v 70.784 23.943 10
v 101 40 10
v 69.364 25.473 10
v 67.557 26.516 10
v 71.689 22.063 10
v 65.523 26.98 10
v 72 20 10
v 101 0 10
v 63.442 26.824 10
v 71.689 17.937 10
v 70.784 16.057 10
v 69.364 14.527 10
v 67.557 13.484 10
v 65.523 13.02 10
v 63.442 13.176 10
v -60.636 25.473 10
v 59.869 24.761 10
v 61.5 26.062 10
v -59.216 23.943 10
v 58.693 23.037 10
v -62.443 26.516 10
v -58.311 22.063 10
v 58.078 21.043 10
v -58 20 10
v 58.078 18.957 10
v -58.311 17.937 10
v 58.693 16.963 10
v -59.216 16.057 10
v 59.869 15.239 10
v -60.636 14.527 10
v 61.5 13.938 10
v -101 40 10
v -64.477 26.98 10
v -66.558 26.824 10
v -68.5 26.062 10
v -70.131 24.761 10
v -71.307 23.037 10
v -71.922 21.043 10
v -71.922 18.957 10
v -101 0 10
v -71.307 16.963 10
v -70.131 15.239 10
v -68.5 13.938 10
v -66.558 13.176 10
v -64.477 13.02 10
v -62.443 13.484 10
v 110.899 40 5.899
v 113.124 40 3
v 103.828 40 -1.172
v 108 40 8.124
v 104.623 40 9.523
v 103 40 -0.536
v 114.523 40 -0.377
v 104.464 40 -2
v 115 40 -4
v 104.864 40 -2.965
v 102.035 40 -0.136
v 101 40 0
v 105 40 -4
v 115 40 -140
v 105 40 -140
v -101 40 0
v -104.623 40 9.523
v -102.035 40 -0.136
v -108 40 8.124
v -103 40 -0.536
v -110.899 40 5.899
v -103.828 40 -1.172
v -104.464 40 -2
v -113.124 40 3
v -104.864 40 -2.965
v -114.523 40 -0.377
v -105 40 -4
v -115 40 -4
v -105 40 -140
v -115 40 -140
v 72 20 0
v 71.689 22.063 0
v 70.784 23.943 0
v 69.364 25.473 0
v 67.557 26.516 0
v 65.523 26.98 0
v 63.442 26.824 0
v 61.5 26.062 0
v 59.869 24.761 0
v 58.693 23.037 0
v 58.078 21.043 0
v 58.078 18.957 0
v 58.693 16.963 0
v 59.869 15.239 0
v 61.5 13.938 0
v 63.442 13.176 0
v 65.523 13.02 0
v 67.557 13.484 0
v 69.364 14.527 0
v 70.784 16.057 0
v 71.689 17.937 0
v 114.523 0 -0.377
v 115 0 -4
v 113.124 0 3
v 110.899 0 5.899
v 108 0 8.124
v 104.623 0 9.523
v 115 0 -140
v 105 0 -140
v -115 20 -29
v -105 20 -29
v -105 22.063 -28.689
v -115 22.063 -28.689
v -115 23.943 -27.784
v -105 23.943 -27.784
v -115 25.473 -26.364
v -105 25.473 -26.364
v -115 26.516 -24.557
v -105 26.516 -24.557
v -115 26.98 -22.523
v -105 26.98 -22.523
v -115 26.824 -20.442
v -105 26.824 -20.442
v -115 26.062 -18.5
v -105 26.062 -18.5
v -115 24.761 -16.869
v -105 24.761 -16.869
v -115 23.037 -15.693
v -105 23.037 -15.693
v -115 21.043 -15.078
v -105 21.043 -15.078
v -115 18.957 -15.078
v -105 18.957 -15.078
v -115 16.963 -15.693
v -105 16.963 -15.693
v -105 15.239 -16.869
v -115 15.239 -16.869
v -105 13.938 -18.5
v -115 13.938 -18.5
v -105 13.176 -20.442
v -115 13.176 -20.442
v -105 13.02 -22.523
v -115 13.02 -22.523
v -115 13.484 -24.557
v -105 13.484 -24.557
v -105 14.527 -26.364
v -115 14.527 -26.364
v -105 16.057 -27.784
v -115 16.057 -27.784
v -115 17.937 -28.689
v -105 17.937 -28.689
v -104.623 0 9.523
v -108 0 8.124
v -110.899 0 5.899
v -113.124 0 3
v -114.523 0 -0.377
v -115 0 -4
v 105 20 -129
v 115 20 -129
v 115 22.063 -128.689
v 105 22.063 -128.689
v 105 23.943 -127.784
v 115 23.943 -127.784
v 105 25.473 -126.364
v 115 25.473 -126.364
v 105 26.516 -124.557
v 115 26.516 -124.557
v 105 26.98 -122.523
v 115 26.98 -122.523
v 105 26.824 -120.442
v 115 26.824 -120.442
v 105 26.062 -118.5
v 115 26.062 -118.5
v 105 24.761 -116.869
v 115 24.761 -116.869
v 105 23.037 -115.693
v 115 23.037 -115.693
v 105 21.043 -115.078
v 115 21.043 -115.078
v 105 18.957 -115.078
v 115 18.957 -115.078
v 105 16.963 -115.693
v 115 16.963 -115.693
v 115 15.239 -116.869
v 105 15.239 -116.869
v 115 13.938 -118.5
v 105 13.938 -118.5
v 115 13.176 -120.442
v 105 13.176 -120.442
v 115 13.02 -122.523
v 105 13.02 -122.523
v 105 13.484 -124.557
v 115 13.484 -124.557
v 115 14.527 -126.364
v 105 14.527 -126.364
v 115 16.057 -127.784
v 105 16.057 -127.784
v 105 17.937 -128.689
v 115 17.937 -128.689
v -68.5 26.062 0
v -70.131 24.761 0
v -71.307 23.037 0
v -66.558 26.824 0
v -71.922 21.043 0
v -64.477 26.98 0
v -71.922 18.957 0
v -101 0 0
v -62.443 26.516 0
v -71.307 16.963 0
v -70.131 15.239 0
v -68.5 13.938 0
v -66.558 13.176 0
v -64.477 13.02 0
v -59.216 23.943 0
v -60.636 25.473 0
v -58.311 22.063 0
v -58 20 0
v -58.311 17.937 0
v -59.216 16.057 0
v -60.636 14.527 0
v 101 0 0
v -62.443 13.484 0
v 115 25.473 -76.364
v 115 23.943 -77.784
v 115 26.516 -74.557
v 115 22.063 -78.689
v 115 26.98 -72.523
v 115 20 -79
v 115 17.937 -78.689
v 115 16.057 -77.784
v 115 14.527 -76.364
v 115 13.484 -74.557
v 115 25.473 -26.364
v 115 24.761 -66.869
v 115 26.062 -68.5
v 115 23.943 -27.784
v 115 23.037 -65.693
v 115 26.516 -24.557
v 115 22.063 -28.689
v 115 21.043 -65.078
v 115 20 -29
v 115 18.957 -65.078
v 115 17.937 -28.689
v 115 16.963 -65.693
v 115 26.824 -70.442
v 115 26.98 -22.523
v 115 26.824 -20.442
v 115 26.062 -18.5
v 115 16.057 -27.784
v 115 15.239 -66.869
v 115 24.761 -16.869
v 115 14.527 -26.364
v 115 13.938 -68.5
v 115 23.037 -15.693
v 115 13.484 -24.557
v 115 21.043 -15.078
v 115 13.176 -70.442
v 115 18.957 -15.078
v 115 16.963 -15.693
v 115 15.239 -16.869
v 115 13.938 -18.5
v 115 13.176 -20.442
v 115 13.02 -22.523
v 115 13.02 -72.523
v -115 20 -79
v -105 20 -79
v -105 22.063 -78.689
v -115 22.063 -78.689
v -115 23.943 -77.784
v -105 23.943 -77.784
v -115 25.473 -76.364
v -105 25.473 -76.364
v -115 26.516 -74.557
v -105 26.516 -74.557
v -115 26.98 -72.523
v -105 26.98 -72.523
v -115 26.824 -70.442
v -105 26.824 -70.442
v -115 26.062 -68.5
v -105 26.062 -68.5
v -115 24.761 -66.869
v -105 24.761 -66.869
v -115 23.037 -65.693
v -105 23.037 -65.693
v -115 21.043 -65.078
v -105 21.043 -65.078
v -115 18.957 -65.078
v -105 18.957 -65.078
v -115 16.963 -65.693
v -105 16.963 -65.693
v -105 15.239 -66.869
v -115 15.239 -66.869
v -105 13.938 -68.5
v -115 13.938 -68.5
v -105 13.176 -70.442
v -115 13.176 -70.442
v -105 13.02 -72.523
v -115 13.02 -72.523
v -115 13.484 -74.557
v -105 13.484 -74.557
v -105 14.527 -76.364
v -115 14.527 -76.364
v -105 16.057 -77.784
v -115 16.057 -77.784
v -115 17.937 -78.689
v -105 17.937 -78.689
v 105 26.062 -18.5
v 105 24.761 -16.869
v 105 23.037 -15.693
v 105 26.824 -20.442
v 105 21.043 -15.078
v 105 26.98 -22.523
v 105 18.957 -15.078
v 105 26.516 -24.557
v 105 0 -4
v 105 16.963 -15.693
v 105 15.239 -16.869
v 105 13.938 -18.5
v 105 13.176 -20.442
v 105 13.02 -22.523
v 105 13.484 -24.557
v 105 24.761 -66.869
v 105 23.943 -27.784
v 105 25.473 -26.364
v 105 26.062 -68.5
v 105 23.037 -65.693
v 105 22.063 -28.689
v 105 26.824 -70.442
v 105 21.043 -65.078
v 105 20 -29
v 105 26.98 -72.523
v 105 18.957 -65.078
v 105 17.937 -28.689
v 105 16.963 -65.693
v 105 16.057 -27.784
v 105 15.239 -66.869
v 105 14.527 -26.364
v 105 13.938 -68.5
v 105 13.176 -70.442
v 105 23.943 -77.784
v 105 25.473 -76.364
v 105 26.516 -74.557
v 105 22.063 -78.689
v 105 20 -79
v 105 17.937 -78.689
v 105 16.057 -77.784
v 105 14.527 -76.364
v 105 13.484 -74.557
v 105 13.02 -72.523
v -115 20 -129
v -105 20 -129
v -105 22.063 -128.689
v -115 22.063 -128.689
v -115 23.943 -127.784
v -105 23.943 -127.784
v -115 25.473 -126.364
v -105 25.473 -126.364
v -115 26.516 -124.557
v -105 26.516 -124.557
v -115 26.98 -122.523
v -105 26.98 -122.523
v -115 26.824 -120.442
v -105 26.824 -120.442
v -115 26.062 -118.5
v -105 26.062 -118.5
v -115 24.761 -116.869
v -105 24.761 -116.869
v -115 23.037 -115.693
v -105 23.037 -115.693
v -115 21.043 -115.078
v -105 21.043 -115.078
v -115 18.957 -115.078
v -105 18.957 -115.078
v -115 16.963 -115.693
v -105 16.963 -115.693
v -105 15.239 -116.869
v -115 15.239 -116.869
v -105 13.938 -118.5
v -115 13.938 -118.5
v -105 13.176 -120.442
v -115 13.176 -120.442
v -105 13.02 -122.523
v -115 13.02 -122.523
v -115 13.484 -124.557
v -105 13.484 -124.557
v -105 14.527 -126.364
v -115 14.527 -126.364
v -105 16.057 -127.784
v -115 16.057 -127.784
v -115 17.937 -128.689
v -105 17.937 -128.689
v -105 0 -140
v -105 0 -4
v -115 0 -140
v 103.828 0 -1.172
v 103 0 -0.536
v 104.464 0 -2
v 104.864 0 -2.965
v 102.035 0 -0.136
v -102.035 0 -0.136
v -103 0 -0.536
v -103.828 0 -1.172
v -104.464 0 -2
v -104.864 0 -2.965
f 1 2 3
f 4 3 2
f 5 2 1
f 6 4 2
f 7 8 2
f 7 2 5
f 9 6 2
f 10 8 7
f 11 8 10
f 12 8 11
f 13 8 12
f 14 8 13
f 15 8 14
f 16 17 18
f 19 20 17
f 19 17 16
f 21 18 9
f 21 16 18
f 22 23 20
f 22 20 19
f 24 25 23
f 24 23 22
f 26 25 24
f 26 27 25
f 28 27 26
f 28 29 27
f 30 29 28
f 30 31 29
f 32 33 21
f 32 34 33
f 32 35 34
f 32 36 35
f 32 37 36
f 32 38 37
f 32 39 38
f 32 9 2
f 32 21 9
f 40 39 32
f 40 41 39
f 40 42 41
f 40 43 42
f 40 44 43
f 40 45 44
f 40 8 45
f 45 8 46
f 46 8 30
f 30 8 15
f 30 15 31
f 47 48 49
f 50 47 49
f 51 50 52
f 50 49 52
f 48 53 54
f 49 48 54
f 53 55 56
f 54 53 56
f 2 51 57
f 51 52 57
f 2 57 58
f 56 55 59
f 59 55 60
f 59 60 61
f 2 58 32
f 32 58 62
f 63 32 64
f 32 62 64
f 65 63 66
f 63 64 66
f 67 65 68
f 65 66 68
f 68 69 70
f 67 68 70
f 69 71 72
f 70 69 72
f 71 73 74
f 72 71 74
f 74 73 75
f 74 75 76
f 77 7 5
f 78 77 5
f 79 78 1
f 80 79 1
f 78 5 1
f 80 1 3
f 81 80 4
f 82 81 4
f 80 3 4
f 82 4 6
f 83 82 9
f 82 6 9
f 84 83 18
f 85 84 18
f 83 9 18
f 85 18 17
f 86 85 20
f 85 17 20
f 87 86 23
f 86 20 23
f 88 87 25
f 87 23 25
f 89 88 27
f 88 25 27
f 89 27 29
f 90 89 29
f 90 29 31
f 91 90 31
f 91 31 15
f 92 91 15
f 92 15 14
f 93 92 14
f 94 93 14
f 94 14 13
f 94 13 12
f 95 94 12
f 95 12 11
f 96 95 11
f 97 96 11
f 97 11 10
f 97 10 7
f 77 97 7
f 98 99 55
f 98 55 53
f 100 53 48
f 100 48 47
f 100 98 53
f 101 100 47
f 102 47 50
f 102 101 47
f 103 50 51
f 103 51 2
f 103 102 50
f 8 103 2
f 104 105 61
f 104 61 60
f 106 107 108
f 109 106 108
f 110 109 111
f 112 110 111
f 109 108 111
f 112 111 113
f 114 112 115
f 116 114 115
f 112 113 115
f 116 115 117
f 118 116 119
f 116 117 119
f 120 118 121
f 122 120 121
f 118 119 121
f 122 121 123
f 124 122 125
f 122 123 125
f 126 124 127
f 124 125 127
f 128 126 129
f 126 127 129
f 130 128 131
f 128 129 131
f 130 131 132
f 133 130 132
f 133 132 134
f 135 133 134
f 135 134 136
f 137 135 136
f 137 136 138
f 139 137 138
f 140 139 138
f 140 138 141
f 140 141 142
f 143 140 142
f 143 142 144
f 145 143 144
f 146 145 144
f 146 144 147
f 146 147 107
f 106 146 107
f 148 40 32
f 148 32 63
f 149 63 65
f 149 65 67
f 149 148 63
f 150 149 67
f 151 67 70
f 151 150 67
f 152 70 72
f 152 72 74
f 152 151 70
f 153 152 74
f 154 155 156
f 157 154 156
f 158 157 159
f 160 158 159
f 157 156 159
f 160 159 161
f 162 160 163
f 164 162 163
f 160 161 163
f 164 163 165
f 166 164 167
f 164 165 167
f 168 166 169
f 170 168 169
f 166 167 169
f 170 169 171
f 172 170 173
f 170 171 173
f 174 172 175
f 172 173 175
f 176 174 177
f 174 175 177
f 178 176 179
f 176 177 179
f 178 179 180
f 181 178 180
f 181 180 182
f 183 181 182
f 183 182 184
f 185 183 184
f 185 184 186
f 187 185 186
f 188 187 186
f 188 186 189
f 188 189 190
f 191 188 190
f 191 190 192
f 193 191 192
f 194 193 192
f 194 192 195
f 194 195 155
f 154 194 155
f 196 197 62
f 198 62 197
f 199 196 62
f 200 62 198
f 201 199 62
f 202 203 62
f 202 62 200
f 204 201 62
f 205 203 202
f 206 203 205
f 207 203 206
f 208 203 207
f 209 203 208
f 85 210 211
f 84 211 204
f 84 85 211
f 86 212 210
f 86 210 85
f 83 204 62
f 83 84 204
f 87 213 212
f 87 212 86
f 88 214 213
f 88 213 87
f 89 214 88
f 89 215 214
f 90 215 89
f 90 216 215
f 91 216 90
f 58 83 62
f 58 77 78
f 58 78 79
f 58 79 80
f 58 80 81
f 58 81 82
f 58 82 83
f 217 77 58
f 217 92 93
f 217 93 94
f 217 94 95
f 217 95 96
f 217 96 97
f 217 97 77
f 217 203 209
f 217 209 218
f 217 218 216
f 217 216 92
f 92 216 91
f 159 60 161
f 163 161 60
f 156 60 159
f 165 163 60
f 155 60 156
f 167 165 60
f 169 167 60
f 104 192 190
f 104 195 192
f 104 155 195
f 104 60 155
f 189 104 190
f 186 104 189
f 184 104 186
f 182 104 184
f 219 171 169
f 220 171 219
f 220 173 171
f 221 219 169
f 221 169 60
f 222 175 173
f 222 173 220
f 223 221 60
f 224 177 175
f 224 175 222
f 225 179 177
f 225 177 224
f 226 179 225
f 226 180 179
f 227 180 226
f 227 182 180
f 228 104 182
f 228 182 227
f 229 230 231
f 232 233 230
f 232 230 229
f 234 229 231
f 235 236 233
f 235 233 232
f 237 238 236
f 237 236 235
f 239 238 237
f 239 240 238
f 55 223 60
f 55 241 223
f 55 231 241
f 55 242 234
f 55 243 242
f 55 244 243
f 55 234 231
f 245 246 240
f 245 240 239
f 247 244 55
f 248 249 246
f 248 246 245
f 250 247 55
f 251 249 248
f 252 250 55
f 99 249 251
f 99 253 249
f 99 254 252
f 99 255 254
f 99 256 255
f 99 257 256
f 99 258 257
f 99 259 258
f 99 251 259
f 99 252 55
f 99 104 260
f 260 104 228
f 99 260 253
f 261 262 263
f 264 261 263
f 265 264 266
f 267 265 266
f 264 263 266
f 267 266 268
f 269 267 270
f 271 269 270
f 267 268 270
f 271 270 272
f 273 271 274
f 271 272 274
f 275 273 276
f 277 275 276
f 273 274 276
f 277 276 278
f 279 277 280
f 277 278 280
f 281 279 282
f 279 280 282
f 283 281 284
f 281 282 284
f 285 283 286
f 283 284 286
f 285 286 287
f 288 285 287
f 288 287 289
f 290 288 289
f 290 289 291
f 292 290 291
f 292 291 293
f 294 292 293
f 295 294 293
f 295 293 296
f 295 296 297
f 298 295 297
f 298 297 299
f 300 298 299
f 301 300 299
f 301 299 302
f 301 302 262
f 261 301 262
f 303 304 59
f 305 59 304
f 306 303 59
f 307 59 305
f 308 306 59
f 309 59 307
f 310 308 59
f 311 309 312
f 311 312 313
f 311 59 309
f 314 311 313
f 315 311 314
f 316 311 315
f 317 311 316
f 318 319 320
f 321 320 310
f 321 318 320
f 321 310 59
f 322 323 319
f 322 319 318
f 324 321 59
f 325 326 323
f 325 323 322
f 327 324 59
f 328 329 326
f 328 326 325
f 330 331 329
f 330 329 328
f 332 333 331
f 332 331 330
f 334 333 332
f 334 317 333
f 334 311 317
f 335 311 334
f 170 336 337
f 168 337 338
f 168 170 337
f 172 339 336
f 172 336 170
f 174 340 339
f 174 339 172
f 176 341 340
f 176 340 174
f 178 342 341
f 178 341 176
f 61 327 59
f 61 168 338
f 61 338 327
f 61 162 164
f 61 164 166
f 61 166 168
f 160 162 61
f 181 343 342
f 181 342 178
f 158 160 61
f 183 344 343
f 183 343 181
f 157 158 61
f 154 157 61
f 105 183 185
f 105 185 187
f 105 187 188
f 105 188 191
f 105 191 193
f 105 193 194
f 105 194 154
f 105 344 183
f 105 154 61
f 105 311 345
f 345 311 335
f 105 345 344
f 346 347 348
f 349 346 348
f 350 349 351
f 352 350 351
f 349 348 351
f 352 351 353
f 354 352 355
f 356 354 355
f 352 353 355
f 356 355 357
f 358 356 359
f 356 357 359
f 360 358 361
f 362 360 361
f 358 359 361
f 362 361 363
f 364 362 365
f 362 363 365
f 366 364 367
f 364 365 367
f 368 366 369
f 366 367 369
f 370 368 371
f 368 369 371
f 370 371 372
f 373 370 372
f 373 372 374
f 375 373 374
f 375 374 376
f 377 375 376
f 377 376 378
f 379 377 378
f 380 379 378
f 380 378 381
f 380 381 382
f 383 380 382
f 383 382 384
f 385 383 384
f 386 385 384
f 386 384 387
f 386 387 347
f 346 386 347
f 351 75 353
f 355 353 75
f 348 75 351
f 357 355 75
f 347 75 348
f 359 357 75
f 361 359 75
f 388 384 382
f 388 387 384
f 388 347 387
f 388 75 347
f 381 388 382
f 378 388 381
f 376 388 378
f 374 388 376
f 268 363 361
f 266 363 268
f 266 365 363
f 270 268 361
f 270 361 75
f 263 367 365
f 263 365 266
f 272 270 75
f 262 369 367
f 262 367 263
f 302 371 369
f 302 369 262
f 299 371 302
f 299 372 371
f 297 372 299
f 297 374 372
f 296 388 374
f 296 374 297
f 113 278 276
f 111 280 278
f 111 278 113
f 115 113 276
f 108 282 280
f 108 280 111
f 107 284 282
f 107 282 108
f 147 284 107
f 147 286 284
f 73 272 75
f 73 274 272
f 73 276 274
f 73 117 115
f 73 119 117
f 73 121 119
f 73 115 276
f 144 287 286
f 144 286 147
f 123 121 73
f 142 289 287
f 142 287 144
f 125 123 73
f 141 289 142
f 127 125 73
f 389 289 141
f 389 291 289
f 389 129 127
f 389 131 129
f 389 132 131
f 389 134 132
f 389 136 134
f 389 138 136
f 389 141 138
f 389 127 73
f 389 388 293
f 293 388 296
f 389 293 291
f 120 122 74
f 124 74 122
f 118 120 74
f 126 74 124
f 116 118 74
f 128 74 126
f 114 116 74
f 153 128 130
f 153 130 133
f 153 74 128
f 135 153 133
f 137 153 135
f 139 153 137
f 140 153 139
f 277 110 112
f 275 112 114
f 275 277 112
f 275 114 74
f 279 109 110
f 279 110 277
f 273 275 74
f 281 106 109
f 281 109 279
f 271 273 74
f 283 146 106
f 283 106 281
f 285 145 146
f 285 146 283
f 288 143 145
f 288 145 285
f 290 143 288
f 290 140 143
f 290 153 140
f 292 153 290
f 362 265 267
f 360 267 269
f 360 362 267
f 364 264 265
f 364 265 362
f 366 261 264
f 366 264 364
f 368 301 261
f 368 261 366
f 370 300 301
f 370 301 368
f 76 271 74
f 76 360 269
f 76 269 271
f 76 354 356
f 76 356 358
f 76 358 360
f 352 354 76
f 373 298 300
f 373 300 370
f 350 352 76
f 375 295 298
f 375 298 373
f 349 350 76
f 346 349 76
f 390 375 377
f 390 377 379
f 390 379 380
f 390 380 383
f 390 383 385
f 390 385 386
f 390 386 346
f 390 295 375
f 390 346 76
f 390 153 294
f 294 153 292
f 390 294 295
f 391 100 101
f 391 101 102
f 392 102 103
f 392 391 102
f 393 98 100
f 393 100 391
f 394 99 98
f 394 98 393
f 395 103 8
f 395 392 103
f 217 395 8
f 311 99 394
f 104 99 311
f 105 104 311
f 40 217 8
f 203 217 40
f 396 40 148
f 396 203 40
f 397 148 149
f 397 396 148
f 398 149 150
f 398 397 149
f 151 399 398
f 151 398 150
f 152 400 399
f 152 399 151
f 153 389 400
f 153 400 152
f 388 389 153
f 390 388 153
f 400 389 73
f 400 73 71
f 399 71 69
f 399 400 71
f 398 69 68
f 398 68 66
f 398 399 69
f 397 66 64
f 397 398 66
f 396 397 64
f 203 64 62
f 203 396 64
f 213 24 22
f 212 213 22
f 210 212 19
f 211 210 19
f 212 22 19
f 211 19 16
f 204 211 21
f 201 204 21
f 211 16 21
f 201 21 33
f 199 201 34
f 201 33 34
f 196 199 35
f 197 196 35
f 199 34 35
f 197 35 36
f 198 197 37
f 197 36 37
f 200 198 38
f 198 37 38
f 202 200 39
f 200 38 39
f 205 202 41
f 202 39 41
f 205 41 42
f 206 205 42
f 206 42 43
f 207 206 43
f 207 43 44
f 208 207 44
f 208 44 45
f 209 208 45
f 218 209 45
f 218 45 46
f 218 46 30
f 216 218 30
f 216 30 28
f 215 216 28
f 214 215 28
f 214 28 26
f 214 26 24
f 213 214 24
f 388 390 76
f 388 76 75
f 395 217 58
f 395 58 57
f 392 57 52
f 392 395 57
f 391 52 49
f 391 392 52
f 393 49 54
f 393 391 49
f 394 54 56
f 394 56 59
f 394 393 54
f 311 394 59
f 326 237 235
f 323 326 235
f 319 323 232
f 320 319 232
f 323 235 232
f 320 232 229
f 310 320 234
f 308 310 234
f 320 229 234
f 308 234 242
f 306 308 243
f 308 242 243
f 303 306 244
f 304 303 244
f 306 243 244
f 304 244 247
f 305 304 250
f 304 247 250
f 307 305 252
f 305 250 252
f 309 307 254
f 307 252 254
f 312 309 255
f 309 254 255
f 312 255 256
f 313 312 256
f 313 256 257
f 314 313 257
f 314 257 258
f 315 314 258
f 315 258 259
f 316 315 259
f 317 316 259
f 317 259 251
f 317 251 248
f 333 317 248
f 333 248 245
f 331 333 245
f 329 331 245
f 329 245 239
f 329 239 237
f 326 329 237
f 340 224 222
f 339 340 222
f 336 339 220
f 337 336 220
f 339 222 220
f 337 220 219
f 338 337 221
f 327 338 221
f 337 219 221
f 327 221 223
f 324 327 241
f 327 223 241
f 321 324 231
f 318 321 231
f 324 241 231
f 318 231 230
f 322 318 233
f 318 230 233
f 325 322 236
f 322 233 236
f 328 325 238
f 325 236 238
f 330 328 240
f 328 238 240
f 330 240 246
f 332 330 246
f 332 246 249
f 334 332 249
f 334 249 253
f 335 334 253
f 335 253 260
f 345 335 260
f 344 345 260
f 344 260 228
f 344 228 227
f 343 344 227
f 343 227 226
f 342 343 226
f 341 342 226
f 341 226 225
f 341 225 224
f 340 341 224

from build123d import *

# Parameters (mm, degrees)
SM_BASE_FLANGE_1_DEPTH = 40
CUT_EXTRUDE_1_REACH    = 195.197
SKETCH_6_R             = 7
CUT_EXTRUDE_2_REACH    = 274.213
SKETCH_7_R             = 7


# Sheet-metal steps are written as plain solids
with BuildPart() as part:
    # Sketch 1 → 基体-法兰1 (new body)
    with BuildSketch(Plane(origin=(0, 0, 0), x_dir=(1, 0, 0), z_dir=(0, 1, 0))):
        with BuildLine():
            Line((-105, 140), (-105, 4))
            ThreePointArc((-105, 4), (-103.828427125, 1.171572875), (-101, 0))
            Line((-101, 0), (101, 0))
            ThreePointArc((101, 0), (103.828427125, 1.171572875), (105, 4))
            Line((105, 4), (105, 140))
            Line((105, 140), (115, 140))
            Line((115, 140), (115, 4))
            ThreePointArc((115, 4), (110.899494937, -5.899494937), (101, -10))
            Line((101, -10), (-101, -10))
            ThreePointArc((-101, -10), (-110.899494937, -5.899494937), (-115, 4))
            Line((-115, 4), (-115, 140))
            Line((-115, 140), (-105, 140))
        make_face()
    extrude(amount=SM_BASE_FLANGE_1_DEPTH)

    # 草图6 → 切除-拉伸1 (cut, up to next)
    with BuildSketch(Plane.XY.offset(10), mode=Mode.PRIVATE) as cut_extrude_1_sk1:
        with Locations((-65, 20)):
            Circle(SKETCH_6_R)
    cut_extrude_1_tool1 = extrude(cut_extrude_1_sk1.sketch, amount=-CUT_EXTRUDE_1_REACH, mode=Mode.PRIVATE) & part.part
    # 草图6 → 切除-拉伸1 (cut, up to next)
    with BuildSketch(Plane.XY.offset(10), mode=Mode.PRIVATE) as cut_extrude_1_sk2:
        with Locations((65, 20)):
            Circle(SKETCH_6_R)
    cut_extrude_1_tool2 = extrude(cut_extrude_1_sk2.sketch, amount=-CUT_EXTRUDE_1_REACH, mode=Mode.PRIVATE) & part.part
    add(cut_extrude_1_tool1.solids().sort_by_distance((-65, 20, 10))[0], mode=Mode.SUBTRACT)
    add(cut_extrude_1_tool2.solids().sort_by_distance((65, 20, 10))[0], mode=Mode.SUBTRACT)

    # 切除-拉伸2: up to this face of the body (flat: up to its plane)
    cut_extrude_2_end = Plane(part.part.faces().sort_by_distance((-115, 20, -72))[0])
    # 草图7 → 切除-拉伸2 (cut, up to the picked face)
    with BuildSketch(Plane(origin=(115, 0, 0), x_dir=(0, 0, -1), z_dir=(1, 0, 0)), mode=Mode.PRIVATE) as cut_extrude_2_sk1:
        with Locations((122, 20)):
            Circle(SKETCH_7_R)
    cut_extrude_2_tool1 = split(extrude(cut_extrude_2_sk1.sketch, amount=-CUT_EXTRUDE_2_REACH, mode=Mode.PRIVATE), bisect_by=cut_extrude_2_end, keep=Keep.BOTH, mode=Mode.PRIVATE)
    # 草图7 → 切除-拉伸2 (cut, up to the picked face)
    with BuildSketch(Plane(origin=(115, 0, 0), x_dir=(0, 0, -1), z_dir=(1, 0, 0)), mode=Mode.PRIVATE) as cut_extrude_2_sk2:
        with Locations((72, 20)):
            Circle(SKETCH_7_R)
    cut_extrude_2_tool2 = split(extrude(cut_extrude_2_sk2.sketch, amount=-CUT_EXTRUDE_2_REACH, mode=Mode.PRIVATE), bisect_by=cut_extrude_2_end, keep=Keep.BOTH, mode=Mode.PRIVATE)
    # 草图7 → 切除-拉伸2 (cut, up to the picked face)
    with BuildSketch(Plane(origin=(115, 0, 0), x_dir=(0, 0, -1), z_dir=(1, 0, 0)), mode=Mode.PRIVATE) as cut_extrude_2_sk3:
        with Locations((22, 20)):
            Circle(SKETCH_7_R)
    cut_extrude_2_tool3 = split(extrude(cut_extrude_2_sk3.sketch, amount=-CUT_EXTRUDE_2_REACH, mode=Mode.PRIVATE), bisect_by=cut_extrude_2_end, keep=Keep.BOTH, mode=Mode.PRIVATE)
    add(cut_extrude_2_tool1.solids().sort_by(Axis((115, 20, -122), (-1, 0, 0)))[0], mode=Mode.SUBTRACT)
    add(cut_extrude_2_tool2.solids().sort_by(Axis((115, 20, -72), (-1, 0, 0)))[0], mode=Mode.SUBTRACT)
    add(cut_extrude_2_tool3.solids().sort_by(Axis((115, 20, -22), (-1, 0, 0)))[0], mode=Mode.SUBTRACT)


solid = part.part
